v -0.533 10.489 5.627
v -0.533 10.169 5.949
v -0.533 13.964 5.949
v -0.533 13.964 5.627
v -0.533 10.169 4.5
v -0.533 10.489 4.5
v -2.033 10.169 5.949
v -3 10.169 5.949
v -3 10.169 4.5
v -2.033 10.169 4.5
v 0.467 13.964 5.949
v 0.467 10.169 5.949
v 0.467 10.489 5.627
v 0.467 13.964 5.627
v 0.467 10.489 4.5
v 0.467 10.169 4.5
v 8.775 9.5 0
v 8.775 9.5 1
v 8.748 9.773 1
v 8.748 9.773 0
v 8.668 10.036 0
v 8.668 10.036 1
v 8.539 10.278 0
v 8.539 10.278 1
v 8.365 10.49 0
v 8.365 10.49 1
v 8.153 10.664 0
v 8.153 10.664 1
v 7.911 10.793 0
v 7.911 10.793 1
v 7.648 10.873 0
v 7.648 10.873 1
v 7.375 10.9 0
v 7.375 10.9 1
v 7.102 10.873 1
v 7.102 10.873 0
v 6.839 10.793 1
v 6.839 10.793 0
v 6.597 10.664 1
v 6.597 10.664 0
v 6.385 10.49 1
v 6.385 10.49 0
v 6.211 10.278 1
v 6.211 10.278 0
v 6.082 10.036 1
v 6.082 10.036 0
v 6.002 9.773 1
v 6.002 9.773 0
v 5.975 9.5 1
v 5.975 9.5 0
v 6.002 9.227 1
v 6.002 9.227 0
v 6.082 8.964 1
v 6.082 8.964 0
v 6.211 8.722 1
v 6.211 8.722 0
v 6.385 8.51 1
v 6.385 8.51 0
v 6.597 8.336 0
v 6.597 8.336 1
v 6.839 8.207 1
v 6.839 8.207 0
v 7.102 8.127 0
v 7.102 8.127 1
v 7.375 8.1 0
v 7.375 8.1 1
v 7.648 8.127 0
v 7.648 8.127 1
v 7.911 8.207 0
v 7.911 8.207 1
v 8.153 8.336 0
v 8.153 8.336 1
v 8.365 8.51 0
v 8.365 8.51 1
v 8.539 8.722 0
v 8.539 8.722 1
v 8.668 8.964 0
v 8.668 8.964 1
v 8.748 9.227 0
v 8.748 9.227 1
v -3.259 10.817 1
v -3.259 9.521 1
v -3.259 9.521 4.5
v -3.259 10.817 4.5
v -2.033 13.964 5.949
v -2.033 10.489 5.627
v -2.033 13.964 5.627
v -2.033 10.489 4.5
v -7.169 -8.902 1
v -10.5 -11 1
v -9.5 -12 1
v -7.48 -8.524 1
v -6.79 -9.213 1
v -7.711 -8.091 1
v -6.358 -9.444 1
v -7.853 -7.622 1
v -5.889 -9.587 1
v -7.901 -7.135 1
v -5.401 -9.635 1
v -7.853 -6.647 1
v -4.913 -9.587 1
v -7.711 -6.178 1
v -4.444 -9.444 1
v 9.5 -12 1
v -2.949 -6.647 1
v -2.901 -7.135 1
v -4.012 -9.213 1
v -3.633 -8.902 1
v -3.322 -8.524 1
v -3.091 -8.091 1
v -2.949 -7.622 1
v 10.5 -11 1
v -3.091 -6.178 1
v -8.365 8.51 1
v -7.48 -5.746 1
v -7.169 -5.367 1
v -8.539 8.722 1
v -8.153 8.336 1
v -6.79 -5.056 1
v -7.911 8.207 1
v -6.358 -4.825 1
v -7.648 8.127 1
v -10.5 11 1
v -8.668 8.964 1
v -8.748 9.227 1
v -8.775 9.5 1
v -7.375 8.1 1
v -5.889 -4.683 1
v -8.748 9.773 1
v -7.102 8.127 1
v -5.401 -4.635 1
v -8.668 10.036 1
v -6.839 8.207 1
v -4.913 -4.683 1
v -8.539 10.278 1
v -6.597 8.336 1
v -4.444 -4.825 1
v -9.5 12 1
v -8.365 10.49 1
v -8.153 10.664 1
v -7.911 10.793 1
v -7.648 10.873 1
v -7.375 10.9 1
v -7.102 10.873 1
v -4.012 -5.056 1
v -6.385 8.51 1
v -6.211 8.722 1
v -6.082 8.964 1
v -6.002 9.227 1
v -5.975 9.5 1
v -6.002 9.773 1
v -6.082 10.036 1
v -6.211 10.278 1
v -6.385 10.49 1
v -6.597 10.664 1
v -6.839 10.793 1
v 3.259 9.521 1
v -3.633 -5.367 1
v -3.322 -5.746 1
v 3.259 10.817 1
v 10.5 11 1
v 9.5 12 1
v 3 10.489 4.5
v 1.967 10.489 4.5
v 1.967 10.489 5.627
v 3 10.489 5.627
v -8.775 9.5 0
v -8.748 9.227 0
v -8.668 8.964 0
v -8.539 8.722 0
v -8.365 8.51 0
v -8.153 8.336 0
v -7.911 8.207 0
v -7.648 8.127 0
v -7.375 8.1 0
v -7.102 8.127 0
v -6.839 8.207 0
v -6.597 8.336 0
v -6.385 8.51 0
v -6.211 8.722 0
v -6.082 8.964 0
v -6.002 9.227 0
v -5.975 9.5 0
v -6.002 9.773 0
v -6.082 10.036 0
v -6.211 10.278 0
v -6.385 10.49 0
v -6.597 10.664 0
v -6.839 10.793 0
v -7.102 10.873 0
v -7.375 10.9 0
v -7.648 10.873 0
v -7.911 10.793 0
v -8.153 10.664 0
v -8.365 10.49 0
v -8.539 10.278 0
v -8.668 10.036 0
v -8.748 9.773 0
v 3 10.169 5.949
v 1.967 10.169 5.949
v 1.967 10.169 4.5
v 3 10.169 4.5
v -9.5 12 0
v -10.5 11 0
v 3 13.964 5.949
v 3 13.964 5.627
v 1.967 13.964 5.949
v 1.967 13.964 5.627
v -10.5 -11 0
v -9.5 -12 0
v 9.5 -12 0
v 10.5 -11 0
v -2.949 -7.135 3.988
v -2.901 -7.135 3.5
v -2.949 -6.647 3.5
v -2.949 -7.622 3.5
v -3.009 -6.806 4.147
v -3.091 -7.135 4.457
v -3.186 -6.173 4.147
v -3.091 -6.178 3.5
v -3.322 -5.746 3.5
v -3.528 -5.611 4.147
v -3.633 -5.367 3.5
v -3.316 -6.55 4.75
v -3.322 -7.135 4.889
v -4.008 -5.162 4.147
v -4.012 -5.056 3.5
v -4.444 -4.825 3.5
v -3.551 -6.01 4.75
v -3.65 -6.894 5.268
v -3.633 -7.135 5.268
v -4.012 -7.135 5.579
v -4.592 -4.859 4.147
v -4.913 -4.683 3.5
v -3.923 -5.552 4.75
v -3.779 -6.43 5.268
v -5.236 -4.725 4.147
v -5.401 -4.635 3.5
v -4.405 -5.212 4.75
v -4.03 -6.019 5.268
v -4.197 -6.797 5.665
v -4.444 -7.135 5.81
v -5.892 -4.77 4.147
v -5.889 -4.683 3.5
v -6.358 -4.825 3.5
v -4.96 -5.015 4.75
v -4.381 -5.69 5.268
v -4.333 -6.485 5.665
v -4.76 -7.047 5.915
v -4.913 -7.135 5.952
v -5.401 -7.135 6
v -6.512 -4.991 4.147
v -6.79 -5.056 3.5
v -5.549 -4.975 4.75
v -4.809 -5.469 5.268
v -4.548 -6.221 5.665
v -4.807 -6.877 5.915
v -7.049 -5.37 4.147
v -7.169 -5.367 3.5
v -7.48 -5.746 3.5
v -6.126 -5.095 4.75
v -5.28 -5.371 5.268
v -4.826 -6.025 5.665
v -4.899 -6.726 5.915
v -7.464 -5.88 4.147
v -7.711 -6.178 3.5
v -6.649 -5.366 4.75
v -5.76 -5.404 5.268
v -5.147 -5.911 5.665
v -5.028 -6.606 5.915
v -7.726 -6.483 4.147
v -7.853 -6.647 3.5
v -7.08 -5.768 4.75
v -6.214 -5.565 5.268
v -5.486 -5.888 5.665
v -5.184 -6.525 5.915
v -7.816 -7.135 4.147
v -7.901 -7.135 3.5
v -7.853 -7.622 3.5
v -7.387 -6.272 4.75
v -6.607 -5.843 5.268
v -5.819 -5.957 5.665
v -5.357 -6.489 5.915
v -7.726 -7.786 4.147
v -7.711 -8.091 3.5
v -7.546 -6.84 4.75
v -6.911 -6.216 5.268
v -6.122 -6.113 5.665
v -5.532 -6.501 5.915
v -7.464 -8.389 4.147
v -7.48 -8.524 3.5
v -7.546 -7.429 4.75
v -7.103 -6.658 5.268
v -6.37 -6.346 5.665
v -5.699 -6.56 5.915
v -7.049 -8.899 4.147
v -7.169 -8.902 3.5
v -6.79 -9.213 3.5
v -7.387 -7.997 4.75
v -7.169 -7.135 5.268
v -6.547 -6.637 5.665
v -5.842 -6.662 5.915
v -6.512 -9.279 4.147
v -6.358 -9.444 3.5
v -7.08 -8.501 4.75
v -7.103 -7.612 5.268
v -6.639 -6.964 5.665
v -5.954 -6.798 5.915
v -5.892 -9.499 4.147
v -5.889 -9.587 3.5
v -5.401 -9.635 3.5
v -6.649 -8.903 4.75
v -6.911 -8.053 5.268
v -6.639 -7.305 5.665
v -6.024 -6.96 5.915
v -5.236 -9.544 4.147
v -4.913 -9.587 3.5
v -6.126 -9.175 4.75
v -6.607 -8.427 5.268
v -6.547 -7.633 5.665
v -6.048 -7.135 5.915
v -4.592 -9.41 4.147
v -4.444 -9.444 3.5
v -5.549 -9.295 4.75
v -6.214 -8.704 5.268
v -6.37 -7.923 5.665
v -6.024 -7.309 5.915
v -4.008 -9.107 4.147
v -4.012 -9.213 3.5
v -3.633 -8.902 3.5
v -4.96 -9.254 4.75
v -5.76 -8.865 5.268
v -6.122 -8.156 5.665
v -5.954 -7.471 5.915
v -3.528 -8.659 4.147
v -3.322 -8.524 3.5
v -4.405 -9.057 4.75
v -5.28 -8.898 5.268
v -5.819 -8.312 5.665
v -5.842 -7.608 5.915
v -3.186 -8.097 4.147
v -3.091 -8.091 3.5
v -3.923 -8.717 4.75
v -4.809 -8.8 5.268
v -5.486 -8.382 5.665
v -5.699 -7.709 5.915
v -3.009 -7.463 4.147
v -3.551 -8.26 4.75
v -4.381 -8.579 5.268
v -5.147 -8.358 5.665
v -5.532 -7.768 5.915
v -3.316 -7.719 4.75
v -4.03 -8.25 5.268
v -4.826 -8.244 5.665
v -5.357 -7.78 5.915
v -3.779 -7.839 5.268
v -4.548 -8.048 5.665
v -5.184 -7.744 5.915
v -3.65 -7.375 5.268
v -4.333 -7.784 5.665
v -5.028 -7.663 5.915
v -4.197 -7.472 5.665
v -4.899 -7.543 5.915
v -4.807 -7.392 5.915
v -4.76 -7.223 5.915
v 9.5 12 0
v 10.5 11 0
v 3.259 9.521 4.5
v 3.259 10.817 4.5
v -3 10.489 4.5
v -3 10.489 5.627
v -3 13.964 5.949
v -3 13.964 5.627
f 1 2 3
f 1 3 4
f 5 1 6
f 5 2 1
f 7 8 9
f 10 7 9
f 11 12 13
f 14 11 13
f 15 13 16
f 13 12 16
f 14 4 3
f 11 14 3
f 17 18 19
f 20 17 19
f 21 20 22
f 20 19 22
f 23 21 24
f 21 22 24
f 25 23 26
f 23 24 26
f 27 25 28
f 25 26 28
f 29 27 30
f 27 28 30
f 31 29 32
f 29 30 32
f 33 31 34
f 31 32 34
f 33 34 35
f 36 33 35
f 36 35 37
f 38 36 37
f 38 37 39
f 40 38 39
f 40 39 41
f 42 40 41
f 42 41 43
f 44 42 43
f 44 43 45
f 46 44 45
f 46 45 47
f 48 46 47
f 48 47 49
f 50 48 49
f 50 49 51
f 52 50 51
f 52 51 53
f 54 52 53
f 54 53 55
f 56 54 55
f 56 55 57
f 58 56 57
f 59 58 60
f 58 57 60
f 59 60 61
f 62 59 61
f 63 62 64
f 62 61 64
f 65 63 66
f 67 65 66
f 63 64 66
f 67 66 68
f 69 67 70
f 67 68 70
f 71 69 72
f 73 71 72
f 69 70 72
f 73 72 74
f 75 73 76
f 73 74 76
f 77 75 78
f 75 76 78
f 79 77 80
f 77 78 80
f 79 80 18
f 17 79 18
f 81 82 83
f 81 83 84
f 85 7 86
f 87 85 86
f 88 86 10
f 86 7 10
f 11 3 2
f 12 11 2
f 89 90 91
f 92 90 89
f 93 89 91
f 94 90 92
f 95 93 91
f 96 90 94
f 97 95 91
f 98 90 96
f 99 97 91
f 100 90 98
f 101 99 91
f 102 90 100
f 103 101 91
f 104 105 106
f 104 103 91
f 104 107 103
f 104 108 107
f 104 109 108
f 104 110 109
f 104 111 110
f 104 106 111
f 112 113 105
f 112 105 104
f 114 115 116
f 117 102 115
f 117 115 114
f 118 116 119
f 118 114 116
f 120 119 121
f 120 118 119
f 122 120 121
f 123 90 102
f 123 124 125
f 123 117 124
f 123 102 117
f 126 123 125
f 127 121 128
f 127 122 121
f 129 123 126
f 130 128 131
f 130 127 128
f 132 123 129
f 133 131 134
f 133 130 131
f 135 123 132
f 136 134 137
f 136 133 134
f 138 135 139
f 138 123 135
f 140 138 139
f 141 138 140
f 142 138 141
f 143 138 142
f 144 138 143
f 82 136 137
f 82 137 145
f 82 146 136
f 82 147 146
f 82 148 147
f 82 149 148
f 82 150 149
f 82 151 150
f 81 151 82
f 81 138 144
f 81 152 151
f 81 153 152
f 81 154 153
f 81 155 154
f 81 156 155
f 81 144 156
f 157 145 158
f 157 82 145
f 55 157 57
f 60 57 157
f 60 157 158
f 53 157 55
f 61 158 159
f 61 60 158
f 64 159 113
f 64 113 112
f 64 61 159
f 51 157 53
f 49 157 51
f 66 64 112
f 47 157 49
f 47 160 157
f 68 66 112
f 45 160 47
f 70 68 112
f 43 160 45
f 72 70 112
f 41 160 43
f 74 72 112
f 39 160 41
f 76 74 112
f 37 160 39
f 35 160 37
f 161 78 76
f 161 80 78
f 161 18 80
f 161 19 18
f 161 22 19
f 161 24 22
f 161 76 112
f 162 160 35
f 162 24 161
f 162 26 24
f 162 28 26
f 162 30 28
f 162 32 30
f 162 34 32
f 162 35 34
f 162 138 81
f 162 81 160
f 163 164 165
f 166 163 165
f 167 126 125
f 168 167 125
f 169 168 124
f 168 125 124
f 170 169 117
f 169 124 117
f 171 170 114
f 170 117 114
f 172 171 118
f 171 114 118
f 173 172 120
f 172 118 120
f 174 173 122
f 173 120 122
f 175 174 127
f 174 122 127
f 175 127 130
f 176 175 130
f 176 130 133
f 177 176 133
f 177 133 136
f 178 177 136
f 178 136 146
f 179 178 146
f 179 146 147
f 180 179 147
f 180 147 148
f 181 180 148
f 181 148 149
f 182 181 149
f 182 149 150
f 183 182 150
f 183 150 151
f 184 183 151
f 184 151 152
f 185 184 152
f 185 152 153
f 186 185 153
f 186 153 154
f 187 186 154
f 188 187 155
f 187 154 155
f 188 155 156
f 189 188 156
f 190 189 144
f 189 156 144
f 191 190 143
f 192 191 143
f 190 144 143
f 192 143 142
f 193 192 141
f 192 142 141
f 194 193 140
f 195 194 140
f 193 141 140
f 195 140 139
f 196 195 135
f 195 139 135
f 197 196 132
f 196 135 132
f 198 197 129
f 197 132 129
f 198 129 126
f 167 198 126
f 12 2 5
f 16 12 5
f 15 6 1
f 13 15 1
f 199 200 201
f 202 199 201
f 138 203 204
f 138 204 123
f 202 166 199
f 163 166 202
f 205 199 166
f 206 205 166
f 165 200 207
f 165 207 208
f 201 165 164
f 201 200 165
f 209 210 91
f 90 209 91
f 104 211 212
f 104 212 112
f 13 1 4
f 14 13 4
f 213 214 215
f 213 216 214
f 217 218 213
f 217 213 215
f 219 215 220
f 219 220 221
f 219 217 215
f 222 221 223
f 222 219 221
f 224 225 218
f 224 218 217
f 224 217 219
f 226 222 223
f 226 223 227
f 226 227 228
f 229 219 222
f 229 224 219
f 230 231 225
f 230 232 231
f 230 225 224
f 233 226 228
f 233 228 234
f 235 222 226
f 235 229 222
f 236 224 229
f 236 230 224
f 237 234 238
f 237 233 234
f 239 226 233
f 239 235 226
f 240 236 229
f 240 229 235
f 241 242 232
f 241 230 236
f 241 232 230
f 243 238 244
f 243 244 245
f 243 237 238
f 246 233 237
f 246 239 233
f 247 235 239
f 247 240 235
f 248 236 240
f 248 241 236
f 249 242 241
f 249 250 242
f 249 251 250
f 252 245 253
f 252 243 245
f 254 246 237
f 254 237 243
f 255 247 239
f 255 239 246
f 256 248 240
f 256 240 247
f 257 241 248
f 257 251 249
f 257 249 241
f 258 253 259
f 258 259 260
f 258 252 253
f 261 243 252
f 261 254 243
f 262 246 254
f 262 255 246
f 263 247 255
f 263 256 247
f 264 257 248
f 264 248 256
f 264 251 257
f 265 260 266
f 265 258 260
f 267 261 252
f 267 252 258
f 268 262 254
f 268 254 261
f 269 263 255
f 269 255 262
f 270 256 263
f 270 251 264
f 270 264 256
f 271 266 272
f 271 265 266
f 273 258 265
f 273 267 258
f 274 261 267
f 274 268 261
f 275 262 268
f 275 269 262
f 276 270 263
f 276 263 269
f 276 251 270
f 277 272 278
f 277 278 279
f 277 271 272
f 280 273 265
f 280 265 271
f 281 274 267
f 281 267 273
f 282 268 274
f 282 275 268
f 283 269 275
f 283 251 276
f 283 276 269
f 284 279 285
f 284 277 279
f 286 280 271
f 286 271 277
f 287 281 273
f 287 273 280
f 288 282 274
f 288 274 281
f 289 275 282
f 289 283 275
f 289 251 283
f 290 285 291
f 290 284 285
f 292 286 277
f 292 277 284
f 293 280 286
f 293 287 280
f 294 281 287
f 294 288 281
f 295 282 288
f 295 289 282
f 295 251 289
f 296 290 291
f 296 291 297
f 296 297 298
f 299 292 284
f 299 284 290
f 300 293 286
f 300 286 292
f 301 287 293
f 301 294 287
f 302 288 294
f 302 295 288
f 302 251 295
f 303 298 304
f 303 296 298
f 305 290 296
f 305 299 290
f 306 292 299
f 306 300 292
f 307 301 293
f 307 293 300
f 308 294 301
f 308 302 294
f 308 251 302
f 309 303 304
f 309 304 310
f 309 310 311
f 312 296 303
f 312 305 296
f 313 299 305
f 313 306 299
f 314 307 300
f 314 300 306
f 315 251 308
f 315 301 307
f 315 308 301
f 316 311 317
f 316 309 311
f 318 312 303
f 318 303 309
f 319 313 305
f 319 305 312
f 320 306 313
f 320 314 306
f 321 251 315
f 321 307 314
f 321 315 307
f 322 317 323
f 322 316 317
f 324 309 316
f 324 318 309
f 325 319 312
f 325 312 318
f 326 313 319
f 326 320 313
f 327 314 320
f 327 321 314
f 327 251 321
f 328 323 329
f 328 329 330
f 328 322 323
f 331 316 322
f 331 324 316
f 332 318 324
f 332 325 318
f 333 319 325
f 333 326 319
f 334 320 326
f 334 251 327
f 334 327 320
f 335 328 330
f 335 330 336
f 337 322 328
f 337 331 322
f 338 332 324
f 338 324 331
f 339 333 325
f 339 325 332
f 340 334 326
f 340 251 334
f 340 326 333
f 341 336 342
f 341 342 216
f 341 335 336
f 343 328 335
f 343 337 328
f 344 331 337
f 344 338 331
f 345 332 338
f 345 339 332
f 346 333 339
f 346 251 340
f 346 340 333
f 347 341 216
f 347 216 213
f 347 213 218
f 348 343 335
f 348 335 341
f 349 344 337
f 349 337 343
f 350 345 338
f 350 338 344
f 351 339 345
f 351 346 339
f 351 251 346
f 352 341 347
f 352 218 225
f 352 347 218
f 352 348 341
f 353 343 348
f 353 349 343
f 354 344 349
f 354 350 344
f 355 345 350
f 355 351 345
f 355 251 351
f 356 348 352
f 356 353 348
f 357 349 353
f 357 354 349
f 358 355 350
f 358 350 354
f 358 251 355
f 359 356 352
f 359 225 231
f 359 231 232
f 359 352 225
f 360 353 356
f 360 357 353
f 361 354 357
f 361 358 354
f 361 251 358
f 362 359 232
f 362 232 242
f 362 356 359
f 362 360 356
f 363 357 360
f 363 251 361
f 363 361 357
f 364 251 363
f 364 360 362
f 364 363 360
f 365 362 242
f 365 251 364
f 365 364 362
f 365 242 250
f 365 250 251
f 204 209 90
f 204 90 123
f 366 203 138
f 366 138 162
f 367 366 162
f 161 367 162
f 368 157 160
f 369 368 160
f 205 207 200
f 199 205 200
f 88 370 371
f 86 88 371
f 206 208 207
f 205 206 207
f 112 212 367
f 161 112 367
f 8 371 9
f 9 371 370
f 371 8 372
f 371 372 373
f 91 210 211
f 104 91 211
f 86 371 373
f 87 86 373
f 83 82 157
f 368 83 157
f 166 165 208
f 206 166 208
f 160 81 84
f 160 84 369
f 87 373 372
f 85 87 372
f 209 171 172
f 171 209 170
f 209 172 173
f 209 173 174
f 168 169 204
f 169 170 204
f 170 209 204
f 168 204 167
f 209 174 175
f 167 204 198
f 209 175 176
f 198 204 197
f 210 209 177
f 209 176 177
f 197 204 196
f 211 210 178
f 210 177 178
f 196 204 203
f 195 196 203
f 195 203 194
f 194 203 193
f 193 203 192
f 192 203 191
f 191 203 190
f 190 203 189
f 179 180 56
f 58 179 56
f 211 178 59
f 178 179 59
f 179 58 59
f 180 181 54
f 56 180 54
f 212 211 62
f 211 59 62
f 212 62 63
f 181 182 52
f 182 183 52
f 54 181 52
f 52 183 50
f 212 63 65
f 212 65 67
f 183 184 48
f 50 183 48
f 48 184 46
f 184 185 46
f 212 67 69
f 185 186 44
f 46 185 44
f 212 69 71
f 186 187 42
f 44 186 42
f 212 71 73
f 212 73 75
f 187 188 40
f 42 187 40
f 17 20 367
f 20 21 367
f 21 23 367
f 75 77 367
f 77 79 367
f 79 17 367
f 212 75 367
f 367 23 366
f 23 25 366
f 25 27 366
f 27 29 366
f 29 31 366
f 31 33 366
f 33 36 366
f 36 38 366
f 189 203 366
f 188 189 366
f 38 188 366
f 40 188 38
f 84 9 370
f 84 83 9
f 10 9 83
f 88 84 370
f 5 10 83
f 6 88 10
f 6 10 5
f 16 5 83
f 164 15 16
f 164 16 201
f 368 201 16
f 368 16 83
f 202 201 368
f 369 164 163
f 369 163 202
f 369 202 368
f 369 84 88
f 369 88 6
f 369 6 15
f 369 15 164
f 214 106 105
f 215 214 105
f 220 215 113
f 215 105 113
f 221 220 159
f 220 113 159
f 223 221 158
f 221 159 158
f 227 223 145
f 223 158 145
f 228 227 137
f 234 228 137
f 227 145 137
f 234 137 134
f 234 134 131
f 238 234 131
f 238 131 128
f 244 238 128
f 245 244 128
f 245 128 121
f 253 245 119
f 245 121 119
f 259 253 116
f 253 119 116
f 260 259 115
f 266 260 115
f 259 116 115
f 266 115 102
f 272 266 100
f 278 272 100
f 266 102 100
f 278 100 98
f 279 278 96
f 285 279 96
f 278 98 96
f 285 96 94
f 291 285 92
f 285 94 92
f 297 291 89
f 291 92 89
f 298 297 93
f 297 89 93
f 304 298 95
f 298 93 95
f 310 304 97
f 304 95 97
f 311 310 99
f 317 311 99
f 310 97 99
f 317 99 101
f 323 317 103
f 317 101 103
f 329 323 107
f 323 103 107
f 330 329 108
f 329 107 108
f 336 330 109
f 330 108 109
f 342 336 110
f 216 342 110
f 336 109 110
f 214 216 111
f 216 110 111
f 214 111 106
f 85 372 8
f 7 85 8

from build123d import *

# Parameters (mm, degrees)
SKETCH_2_W           = 21
SKETCH_2_H           = 24
EXTRUDE_1_DEPTH      = 1
SKETCH_3_R           = 1.4
CUT_EXTRUDE_1_DEPTH  = 16.976545309
SKETCH_4_R           = 2.5
EXTRUDE_2_DEPTH      = 5
CHAMFER_1_SIZE       = 1
FILLET_3_R           = 2.5
SKETCH_5_W           = 6.518787968
SKETCH_5_H           = 1.296166803
EXTRUDE_3_DEPTH      = 3.5
EXTRUDE_4_DEPTH      = 3
EXTRUDE_4_DEPTH_BACK = 3
SKETCH_8_W           = 1.5
SKETCH_8_H           = 1.449096172
CUT_EXTRUDE_3_DEPTH  = 19.473018506


with BuildPart() as part:
    # 草图2 → 凸台-拉伸1 (new body)
    with BuildSketch(Plane.XY):
        Rectangle(SKETCH_2_W, SKETCH_2_H)
    extrude(amount=EXTRUDE_1_DEPTH)

    # 草图3 → 切除-拉伸1 (cut, through all)
    with BuildSketch(Plane.XY.offset(1)):
        with Locations((7.375, 9.5)):
            Circle(SKETCH_3_R)
        with Locations((-7.375, 9.5)):
            Circle(SKETCH_3_R)
    extrude(amount=-CUT_EXTRUDE_1_DEPTH, mode=Mode.SUBTRACT)

    # 草图4 → 凸台-拉伸2 (add)
    with BuildSketch(Plane.XY.offset(1)):
        with Locations((-5.400830934, -7.13462041)):
            Circle(SKETCH_4_R)
    extrude(amount=EXTRUDE_2_DEPTH)

    # 倒角1
    chamfer_1_edges = [part.edges().sort_by_distance(p)[0] for p in [
        (-10.5, 12, 0.5),
        (10.5, -12, 0.5),
        (-10.5, -12, 0.5),
        (10.5, 12, 0.5),
    ]]
    chamfer(chamfer_1_edges, length=CHAMFER_1_SIZE)

    # 圆角3
    fillet_3_edges = [part.edges().sort_by_distance(p)[0] for p in [
        (-7.900830934, -7.13462041, 6),
    ]]
    fillet(fillet_3_edges, radius=FILLET_3_R)

    # 草图5 → 凸台-拉伸3 (add)
    with BuildSketch(Plane.XY.offset(1)):
        with Locations((0, 10.168737176)):
            Rectangle(SKETCH_5_W, SKETCH_5_H)
    extrude(amount=EXTRUDE_3_DEPTH)

    # 草图7 → 凸台-拉伸4 (add, two sides: drawn at the far end of the back side and taken through both)
    with BuildSketch(Plane(origin=(0, 0, 0), x_dir=(0, 0, -1), z_dir=(1, 0, 0)).offset(-EXTRUDE_4_DEPTH_BACK)):
        Polygon((-4.5, 10.48888975), (-5.626632975, 10.48888975), (-5.626632975, 13.964326433), (-5.949096172, 13.964326433), (-5.949096172, 10.168737175), (-4.5, 10.168737175), align=None)
    extrude(amount=EXTRUDE_4_DEPTH + EXTRUDE_4_DEPTH_BACK)

    # 草图8 → 切除-拉伸3 (cut, through all)
    with BuildSketch(Plane(origin=(0, 0, 0), x_dir=(1, 0, 0), z_dir=(0, 1, 0))):
        with Locations((-1.28314556, -5.224548086)):
            Rectangle(SKETCH_8_W, SKETCH_8_H)
        with Locations((1.21685444, -5.224548086)):
            Rectangle(SKETCH_8_W, SKETCH_8_H)
    extrude(amount=CUT_EXTRUDE_3_DEPTH, mode=Mode.SUBTRACT)


solid = part.part
